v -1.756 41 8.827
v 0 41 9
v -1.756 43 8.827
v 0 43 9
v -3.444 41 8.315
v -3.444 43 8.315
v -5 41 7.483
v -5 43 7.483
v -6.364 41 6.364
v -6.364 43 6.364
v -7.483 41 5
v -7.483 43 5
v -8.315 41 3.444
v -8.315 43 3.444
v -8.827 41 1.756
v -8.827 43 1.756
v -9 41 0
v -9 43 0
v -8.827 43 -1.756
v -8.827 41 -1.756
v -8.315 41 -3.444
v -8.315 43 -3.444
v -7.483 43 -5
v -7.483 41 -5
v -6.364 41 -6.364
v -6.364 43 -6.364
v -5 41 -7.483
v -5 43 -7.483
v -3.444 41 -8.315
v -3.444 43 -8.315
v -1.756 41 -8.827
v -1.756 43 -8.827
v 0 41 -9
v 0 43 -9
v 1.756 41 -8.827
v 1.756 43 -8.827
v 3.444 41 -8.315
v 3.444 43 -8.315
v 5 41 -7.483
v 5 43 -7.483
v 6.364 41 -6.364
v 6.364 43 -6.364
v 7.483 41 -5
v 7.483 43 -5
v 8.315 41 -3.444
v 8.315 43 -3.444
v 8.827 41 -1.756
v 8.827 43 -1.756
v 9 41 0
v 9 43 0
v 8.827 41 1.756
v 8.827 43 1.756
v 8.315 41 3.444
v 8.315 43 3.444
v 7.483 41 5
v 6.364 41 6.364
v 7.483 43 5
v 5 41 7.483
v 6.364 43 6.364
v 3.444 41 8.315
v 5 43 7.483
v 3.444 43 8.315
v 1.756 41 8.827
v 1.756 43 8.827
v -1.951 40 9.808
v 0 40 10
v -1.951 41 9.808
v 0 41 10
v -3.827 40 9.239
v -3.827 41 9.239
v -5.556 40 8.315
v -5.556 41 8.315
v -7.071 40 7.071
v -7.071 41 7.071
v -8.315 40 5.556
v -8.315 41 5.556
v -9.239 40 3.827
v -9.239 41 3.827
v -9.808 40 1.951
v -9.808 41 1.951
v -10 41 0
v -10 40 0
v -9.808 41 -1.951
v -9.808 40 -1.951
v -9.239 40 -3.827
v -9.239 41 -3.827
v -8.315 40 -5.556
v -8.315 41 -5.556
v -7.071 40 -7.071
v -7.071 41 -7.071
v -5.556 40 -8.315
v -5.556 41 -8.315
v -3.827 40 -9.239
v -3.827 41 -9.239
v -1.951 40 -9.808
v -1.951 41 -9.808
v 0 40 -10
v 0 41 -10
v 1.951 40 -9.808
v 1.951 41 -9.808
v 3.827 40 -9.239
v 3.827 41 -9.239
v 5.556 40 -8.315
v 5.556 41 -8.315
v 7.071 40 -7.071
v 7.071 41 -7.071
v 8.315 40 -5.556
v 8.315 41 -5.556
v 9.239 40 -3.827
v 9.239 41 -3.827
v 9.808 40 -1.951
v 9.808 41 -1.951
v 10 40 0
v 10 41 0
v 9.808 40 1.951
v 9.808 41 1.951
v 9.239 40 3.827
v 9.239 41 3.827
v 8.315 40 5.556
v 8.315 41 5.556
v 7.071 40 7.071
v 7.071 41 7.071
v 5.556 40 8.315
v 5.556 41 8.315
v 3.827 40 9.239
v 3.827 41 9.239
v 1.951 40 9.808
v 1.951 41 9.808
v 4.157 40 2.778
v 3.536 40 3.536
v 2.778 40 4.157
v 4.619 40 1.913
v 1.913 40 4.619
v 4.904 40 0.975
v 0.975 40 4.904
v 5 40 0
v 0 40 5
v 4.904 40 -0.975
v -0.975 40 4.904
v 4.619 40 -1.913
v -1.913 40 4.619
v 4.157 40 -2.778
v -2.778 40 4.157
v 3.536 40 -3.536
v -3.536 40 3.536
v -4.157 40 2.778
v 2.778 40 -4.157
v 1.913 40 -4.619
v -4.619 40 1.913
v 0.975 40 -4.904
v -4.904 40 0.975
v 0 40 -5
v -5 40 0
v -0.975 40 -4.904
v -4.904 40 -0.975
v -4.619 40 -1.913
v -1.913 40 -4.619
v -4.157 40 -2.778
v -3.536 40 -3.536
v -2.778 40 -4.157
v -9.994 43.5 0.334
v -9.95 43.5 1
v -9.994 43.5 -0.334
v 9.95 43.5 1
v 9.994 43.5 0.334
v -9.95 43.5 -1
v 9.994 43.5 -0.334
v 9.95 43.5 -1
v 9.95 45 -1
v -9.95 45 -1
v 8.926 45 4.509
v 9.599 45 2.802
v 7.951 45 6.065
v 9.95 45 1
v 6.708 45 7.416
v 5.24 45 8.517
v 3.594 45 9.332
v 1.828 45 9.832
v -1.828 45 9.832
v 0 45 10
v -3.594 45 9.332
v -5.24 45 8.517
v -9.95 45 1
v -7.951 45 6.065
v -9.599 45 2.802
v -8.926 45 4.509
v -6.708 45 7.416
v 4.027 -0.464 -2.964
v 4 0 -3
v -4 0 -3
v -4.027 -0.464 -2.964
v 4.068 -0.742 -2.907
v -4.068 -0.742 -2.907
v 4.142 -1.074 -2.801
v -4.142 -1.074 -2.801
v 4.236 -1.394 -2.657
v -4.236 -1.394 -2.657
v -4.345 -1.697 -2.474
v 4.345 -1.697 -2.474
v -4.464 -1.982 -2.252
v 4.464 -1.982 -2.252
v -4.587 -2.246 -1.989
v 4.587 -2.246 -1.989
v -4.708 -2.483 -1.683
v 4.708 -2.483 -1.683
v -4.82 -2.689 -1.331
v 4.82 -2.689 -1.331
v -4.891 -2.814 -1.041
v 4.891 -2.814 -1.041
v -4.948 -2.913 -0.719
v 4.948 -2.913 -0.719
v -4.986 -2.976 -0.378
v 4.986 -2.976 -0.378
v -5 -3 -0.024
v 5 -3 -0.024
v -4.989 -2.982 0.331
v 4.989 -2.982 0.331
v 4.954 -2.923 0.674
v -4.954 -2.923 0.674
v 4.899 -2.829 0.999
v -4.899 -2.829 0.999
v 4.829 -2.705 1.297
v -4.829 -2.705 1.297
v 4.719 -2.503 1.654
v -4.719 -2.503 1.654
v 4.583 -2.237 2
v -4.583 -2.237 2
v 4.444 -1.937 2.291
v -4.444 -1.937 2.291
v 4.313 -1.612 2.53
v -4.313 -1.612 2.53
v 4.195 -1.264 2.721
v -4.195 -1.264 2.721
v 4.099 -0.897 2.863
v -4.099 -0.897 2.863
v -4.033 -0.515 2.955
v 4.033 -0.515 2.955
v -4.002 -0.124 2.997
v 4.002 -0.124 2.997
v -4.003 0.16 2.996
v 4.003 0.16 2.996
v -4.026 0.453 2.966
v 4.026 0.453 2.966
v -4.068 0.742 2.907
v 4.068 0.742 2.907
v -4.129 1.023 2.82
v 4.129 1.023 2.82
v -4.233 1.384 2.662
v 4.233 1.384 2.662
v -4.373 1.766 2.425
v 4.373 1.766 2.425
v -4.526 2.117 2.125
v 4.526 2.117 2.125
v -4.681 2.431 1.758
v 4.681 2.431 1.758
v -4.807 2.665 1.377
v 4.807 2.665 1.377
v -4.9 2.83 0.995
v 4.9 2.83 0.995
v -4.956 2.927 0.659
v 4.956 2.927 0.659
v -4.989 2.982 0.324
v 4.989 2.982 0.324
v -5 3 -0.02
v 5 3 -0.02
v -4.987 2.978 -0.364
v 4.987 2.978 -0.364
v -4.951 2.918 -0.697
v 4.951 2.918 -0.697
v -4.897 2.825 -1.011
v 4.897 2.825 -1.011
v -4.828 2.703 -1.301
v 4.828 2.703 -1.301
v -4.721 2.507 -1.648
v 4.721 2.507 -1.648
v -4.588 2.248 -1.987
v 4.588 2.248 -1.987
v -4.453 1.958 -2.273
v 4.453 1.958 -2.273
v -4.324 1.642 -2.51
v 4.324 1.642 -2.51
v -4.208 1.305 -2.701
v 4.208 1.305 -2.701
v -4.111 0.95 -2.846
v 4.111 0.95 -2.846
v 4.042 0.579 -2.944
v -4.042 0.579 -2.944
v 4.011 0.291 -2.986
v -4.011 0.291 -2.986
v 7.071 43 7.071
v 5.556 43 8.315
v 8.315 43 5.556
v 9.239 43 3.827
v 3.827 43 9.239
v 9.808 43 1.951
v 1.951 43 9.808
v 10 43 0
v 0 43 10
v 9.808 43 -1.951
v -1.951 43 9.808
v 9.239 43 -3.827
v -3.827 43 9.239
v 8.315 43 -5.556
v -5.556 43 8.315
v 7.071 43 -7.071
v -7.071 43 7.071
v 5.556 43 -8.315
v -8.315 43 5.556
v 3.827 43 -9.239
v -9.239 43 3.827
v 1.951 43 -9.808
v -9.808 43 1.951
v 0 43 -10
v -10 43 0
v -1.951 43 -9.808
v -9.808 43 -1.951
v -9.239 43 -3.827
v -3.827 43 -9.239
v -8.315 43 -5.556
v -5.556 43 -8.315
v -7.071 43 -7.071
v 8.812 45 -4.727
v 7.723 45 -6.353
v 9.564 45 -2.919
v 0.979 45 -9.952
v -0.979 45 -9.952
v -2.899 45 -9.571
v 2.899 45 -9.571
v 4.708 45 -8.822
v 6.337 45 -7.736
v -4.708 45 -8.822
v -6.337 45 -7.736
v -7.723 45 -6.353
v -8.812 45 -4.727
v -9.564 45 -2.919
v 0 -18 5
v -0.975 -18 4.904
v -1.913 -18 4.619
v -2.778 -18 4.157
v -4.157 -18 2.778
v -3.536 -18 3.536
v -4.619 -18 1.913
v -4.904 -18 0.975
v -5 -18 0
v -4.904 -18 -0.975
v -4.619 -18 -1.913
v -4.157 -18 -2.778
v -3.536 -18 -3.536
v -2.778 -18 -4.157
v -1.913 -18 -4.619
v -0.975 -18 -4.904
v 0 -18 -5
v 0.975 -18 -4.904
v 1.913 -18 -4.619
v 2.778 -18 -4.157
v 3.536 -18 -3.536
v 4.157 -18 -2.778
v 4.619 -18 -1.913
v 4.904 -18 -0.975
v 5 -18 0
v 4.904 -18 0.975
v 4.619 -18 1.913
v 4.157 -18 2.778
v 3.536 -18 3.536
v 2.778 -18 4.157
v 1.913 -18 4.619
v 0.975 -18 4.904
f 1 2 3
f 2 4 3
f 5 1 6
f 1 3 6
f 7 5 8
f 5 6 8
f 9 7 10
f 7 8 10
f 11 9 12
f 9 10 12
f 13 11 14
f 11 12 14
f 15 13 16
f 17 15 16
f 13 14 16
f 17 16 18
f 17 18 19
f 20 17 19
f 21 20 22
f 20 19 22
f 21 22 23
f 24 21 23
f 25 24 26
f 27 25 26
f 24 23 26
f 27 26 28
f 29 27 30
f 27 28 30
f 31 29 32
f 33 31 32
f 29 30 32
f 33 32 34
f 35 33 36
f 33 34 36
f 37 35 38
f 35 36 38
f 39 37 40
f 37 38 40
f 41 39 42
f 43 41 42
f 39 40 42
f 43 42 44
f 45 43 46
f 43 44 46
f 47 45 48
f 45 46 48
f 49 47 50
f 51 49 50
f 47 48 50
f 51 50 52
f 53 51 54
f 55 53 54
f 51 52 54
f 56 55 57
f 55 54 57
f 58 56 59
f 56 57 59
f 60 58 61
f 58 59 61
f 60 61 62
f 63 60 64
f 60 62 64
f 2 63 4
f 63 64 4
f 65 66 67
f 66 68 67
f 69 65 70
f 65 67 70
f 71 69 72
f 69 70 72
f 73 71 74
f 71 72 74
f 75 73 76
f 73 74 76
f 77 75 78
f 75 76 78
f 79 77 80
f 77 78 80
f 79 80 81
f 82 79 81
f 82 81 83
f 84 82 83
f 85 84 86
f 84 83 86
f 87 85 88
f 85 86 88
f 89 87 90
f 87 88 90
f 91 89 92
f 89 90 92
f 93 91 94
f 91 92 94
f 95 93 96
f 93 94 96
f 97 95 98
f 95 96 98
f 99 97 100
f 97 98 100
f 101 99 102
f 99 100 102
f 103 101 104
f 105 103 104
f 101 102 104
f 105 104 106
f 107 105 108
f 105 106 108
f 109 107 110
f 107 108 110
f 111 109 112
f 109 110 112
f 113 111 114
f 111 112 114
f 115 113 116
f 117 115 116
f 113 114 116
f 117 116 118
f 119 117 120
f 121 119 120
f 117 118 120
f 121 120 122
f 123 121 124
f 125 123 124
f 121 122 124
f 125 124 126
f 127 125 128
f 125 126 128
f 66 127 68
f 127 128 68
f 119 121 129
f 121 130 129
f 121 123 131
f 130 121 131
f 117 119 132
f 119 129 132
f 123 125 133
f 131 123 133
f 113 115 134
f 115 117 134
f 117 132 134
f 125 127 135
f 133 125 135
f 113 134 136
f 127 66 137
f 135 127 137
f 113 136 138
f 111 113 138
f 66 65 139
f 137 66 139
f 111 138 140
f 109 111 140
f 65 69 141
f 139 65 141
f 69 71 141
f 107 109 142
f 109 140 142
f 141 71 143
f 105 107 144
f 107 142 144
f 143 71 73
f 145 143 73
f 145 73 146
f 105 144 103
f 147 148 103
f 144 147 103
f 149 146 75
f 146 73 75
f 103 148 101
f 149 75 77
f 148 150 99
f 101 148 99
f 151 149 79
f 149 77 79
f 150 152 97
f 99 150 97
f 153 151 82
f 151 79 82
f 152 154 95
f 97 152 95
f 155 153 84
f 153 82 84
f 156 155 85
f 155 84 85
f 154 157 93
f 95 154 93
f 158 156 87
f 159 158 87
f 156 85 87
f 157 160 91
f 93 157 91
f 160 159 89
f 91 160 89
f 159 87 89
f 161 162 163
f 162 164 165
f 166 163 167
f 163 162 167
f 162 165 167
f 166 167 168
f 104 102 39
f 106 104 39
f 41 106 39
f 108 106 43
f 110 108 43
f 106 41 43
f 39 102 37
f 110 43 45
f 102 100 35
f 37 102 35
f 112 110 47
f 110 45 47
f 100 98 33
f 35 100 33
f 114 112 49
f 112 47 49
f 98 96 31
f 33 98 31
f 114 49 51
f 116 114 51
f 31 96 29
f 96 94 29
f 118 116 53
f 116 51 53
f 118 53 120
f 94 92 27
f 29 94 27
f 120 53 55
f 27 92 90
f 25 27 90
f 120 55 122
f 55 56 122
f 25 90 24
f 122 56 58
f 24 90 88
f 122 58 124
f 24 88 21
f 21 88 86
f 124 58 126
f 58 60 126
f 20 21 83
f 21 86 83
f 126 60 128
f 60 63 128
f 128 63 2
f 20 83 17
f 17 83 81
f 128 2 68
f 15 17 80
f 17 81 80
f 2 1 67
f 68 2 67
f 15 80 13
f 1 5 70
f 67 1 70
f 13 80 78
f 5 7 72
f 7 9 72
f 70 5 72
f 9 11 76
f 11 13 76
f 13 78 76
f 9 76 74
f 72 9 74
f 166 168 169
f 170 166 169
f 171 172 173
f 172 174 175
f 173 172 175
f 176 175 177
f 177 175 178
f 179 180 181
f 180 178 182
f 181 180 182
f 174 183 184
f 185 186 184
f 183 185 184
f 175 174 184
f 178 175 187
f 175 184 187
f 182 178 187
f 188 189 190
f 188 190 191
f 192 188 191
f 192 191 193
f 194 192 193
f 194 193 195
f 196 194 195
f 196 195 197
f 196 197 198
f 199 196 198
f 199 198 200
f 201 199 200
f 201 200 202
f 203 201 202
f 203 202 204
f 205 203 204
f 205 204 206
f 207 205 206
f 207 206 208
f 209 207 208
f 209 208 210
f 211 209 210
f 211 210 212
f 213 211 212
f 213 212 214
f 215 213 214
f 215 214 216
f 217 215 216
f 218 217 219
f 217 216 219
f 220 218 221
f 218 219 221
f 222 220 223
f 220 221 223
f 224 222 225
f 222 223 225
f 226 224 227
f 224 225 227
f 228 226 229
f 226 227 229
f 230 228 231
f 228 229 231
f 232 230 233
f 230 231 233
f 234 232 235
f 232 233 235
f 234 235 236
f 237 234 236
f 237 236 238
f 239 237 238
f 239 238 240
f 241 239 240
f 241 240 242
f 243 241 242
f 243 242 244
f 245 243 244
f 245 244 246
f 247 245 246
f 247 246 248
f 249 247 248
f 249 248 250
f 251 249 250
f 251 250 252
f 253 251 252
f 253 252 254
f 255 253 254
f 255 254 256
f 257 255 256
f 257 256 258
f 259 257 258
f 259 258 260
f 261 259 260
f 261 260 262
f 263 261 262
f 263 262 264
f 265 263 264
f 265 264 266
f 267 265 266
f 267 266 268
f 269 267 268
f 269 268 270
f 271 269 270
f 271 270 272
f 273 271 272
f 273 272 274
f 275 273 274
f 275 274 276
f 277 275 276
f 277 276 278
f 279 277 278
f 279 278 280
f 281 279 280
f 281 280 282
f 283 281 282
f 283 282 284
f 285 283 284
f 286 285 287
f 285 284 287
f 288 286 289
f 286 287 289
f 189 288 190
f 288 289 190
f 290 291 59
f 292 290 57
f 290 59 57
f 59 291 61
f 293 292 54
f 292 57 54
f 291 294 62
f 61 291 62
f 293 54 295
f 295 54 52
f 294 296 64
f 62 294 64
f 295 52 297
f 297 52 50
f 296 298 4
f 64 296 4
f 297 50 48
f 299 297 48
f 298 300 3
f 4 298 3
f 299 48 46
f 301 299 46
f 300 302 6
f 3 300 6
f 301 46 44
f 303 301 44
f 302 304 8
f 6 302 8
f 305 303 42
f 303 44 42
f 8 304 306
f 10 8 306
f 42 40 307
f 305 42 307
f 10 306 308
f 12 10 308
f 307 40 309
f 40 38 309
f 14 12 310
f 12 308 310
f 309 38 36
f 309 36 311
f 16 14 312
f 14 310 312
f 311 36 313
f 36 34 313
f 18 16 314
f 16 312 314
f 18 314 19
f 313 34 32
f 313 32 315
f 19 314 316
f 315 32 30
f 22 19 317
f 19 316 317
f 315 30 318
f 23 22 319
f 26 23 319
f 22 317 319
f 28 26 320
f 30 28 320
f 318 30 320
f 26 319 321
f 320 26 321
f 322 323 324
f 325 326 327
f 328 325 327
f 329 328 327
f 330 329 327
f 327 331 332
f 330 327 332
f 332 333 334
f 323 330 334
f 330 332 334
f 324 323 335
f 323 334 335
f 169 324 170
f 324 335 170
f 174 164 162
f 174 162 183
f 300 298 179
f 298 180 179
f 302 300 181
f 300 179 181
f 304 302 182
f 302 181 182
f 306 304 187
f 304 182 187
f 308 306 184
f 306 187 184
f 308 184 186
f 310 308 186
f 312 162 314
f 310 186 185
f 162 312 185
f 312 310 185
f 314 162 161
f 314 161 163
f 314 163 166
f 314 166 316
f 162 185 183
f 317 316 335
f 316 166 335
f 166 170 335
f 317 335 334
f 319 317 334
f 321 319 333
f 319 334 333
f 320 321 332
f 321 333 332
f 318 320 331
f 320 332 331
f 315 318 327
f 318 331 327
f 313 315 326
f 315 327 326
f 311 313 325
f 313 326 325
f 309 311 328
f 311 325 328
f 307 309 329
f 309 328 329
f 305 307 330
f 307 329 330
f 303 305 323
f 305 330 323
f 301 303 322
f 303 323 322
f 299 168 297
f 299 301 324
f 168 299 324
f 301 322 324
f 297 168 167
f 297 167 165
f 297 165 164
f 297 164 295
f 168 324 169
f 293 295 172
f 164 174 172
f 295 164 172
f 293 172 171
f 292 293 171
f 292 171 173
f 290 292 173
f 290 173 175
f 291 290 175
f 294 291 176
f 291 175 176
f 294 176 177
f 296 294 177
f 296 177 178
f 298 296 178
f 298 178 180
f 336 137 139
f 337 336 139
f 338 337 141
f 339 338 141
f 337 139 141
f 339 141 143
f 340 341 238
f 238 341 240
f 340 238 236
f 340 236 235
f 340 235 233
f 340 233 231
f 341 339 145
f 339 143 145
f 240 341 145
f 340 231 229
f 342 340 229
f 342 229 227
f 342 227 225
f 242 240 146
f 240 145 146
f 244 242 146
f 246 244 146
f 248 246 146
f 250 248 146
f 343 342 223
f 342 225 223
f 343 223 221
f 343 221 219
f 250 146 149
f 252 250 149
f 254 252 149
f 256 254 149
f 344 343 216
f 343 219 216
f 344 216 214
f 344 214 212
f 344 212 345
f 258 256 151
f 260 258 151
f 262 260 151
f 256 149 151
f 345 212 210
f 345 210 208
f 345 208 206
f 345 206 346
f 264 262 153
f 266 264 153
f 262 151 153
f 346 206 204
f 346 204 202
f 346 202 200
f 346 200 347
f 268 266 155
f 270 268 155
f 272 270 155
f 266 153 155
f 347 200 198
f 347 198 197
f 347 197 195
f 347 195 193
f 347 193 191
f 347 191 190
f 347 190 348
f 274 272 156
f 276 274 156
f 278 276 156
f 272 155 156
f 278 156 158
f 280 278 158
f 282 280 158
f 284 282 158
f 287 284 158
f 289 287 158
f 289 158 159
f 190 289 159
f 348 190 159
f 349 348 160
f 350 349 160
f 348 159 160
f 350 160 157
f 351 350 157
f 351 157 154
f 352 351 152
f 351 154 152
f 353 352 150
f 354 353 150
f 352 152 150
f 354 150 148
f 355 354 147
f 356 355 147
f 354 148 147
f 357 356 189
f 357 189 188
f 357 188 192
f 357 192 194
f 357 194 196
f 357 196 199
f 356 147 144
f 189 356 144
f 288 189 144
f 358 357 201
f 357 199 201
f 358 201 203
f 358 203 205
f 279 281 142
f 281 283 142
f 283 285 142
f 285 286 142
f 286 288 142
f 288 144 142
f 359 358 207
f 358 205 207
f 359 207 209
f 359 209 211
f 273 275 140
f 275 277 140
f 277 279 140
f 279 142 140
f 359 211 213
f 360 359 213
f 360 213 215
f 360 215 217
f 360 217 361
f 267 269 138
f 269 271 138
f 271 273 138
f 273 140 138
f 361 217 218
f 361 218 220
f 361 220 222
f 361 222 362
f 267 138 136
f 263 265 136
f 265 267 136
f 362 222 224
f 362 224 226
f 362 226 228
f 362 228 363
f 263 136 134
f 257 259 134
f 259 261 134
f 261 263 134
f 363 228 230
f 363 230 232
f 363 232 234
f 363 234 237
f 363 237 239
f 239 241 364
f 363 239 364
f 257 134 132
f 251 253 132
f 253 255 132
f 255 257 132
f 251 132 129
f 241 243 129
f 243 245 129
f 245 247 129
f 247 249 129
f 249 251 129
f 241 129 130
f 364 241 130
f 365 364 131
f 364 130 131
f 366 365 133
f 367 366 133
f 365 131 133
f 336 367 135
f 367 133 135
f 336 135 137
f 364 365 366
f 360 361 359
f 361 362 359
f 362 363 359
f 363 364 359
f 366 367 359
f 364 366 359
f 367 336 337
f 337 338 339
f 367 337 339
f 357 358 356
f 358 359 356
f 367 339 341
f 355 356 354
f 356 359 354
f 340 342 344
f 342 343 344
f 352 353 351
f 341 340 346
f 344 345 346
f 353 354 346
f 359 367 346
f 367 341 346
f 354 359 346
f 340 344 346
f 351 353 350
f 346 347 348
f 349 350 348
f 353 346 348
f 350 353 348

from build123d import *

# Parameters (mm, degrees)
SKIZZE5_W                            = 2
SKIZZE5_H                            = 1.5
SCHNITT_LINEAR_AUSTRAGEN1_DEPTH      = 11
SCHNITT_LINEAR_AUSTRAGEN1_DEPTH_BACK = 11
F_6_0_6_DURCHMESSER_BOHRUNG1_D       = 6


with BuildPart() as part:
    # Skizze1 → Rotation1 (revolve)
    with BuildSketch(Plane(origin=(0, 0, 0), x_dir=(0, 0, -1), z_dir=(1, 0, 0)), mode=Mode.PRIVATE) as rotation1_sk:
        Polygon((10, 43), (10, 45), (0, 45), (0, -18), (5, -18), (5, 40), (10, 40), (10, 41), (9, 41), (9, 43), align=None)
    revolve(rotation1_sk.sketch.rotate(Axis((0, -18, 0), (0, -1, 0)), 180), axis=Axis((0, -18, 0), (0, -1, 0)))  # turned: the seam where the file's is

    # Skizze5 → Schnitt-Linear austragen1 (cut, two sides)
    with BuildSketch(Plane(origin=(0, 0, 0), x_dir=(0, 0, -1), z_dir=(1, 0, 0))) as schnitt_linear_austragen1_sk:
        with Locations((0, 44.25)):
            Rectangle(SKIZZE5_W, SKIZZE5_H)
    extrude(amount=SCHNITT_LINEAR_AUSTRAGEN1_DEPTH, mode=Mode.SUBTRACT)
    extrude(schnitt_linear_austragen1_sk.sketch, amount=-SCHNITT_LINEAR_AUSTRAGEN1_DEPTH_BACK, mode=Mode.SUBTRACT)

    # Ø6.0 (6) Durchmesser Bohrung1 (through all)
    with Locations(Plane(origin=(5, 0, 0), x_dir=(0, 0, 1), z_dir=(1, 0, 0))):
        with Locations((0, 0)):
            Hole(F_6_0_6_DURCHMESSER_BOHRUNG1_D / 2)


solid = part.part
